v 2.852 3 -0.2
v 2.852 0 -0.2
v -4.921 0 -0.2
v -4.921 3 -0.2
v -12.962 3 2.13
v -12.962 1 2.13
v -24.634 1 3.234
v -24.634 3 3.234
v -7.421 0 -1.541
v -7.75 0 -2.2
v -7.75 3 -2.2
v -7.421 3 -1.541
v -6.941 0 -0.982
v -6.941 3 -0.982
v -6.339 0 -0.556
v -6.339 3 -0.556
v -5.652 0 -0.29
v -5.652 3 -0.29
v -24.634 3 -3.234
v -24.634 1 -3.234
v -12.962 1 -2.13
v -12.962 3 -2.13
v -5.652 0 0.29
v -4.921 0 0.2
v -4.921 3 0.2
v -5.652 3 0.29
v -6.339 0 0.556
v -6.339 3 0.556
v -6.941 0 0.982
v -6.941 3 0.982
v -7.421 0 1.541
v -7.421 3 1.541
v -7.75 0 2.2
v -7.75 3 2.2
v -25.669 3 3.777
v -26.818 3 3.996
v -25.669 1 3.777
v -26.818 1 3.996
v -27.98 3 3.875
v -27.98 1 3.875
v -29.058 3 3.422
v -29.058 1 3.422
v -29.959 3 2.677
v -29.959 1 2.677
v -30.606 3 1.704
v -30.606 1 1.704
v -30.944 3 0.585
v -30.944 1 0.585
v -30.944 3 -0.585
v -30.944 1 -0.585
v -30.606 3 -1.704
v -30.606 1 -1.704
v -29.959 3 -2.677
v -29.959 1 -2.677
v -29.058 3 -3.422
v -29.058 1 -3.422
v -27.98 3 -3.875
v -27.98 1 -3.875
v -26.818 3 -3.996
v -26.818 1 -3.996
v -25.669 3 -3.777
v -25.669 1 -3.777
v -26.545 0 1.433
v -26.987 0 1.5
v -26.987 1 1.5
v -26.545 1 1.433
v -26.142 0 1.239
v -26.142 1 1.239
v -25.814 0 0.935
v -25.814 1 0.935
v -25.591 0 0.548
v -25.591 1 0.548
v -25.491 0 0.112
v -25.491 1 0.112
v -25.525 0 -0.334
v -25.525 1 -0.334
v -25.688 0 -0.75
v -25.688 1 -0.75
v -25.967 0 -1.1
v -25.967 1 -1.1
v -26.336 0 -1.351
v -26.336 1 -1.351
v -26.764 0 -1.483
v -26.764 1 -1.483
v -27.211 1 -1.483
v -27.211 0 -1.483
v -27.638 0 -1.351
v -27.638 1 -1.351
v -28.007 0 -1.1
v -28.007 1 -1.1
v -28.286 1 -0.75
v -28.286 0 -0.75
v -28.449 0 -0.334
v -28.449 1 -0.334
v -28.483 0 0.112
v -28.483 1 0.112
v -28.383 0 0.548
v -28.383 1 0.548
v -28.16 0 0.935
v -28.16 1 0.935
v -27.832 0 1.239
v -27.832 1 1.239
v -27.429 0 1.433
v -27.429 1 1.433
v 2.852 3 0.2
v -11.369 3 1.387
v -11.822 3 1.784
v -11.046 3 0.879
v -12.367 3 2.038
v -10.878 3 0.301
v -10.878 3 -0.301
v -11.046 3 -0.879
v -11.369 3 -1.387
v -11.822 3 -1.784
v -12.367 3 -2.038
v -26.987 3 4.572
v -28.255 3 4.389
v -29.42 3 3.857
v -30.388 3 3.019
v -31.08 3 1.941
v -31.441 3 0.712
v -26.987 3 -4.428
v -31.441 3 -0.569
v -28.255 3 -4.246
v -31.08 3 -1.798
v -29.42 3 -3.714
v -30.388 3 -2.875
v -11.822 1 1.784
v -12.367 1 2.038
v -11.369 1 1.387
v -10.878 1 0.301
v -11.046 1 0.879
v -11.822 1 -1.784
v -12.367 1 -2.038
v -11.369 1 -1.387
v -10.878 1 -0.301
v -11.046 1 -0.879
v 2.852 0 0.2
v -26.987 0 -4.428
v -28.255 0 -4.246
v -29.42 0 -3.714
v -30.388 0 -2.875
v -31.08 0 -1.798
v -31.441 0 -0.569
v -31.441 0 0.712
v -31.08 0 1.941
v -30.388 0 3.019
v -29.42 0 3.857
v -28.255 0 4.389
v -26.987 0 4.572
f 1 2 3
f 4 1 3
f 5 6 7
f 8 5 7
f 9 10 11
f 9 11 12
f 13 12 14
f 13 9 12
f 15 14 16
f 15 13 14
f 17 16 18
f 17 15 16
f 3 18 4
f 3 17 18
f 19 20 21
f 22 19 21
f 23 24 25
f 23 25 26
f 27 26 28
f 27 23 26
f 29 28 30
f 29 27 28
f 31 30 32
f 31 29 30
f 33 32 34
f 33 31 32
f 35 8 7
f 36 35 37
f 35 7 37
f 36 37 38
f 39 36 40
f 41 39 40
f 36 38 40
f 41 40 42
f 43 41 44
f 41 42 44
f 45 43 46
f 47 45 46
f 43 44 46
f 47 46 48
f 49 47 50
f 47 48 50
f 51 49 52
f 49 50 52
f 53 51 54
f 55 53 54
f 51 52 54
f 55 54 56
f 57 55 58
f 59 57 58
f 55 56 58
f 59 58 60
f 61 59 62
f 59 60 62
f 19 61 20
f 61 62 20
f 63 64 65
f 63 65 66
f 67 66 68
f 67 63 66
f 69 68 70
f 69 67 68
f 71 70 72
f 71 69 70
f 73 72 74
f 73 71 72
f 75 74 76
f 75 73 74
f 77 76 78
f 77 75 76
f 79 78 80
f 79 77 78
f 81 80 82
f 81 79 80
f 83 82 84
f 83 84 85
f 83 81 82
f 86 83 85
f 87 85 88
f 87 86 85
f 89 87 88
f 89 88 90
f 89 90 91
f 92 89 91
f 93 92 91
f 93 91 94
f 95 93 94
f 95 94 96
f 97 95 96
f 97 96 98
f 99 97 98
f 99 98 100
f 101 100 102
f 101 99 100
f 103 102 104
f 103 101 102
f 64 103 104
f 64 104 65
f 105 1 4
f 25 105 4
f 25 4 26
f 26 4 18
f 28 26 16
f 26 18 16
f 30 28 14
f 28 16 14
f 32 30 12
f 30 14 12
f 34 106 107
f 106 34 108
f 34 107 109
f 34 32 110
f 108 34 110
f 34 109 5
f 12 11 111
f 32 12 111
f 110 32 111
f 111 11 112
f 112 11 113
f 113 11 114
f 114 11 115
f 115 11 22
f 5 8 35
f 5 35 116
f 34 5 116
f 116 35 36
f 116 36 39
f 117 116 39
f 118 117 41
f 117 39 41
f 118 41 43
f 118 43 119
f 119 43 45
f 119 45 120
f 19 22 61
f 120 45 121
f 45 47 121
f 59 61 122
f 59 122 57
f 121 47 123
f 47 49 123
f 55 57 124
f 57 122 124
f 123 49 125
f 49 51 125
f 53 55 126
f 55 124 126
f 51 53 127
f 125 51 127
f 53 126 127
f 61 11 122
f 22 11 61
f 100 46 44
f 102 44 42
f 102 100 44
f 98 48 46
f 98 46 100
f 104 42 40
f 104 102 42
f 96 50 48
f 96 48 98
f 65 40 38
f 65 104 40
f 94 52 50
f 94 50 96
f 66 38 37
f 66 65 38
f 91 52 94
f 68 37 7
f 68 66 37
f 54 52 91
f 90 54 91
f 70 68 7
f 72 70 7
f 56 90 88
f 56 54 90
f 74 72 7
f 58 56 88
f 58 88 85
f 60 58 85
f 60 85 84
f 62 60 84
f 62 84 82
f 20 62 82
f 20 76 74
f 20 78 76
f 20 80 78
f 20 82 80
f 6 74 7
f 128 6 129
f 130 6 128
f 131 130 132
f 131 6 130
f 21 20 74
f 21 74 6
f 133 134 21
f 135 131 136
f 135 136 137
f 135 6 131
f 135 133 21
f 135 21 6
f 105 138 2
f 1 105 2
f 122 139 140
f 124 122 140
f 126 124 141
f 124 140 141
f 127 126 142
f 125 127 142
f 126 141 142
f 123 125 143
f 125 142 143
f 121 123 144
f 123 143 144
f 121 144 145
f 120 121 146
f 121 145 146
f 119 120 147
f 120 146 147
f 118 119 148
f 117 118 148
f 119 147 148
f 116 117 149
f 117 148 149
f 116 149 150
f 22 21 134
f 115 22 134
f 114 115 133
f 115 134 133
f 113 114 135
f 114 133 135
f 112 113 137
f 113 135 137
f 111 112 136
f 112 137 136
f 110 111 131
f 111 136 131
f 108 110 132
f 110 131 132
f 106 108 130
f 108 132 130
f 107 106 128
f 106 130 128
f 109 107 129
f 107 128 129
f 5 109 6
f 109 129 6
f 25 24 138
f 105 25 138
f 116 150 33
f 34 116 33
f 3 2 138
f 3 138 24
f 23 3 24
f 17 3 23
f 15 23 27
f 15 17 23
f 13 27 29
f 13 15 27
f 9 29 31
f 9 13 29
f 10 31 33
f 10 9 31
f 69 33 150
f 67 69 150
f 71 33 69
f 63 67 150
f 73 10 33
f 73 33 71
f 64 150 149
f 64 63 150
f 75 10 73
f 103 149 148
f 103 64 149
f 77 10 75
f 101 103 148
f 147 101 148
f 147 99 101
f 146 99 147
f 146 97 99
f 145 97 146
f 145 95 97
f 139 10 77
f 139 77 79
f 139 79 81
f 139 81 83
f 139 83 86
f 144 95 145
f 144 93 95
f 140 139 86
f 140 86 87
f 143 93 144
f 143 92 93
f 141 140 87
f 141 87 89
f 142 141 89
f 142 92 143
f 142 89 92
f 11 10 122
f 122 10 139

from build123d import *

# Parameters (mm, degrees)
SKETCH2_R           = 1.5
BOSS_EXTRUDE1_DEPTH = 1
BOSS_EXTRUDE2_DEPTH = 3
FILLET1_R           = 3


with BuildPart() as part:
    # Sketch2 → Boss-Extrude1 (new body)
    with BuildSketch(Plane(origin=(0, 0, 0), x_dir=(1, 0, 0), z_dir=(0, 1, 0))):
        with BuildLine():
            Line((-24.633695323, -3.234416395), (-12.961942578, -2.130426094))
            ThreePointArc((-12.961942578, -2.130426094), (-10.856533145, 0), (-12.961942578, 2.130426094))
            Line((-12.961942578, 2.130426094), (-24.633695323, 3.234416395))
            ThreePointArc((-24.633695323, 3.234416395), (-30.987107864, 0), (-24.633695323, -3.234416395))
        make_face()
        with Locations(Location((-26.987107864, 0, 0), (0, 0, 270))):
            Circle(SKETCH2_R, mode=Mode.SUBTRACT)
    extrude(amount=BOSS_EXTRUDE1_DEPTH)

    # Sketch2<3> → Boss-Extrude2 (add)
    with BuildSketch(Plane(origin=(0, 0, 0), x_dir=(1, 0, 0), z_dir=(0, 1, 0))):
        with BuildLine():
            Line((-7.749705802, -2.2), (-7.749705802, -0.2))
            Line((-7.749705802, -0.2), (2.851546862, -0.2))
            Line((2.851546862, -0.2), (2.851546862, 0.2))
            Line((2.851546862, 0.2), (-7.749705802, 0.2))
            Line((-7.749705802, 0.2), (-7.749705802, 2.2))
            Line((-7.749705802, 2.2), (-26.987107864, 4.428352964))
            ThreePointArc((-26.987107864, 4.428352964), (-31.487107864, -0.071647036), (-26.987107864, -4.571647036))
            Line((-26.987107864, -4.571647036), (-7.749705802, -2.2))
        make_face()
        with BuildLine():
            ThreePointArc((-24.633695323, -3.234416395), (-30.987107864, 0), (-24.633695323, 3.234416395))
            Line((-24.633695323, 3.234416395), (-12.961942578, 2.130426094))
            ThreePointArc((-12.961942578, 2.130426094), (-10.856533145, 0), (-12.961942578, -2.130426094))
            Line((-12.961942578, -2.130426094), (-24.633695323, -3.234416395))
        make_face(mode=Mode.SUBTRACT)
    extrude(amount=BOSS_EXTRUDE2_DEPTH)

    # Fillet1
    # the kernel refuses this fillet: 3 mm, written as the material it adds along each edge
    with BuildSketch(Plane(origin=(-7.749705802, 0, 0.2), x_dir=(0, 0, 1), z_dir=(0, 1, 0))) as fillet1_piece_1:
        with BuildLine():
            CenterArc((3, 2.828427125), FILLET1_R, 180, 70.528779366)
            Line((0, 2.828427125), (-0.06, 2.828427125))
            Line((-0.06, 2.828427125), (-0.06, 0))
            Line((-0.06, 0), (0, -0.06))
            ThreePointArc((0, -0.06), (1, -0.06), (1.98, -0.056568542))
            Line((1.98, -0.056568542), (2, 0))
        make_face()
    extrude(amount=3)
    with BuildSketch(Plane(origin=(-7.749705802, 0, -0.2), x_dir=(1, 0, 0), z_dir=(0, 1, 0))) as fillet1_piece_2:
        with BuildLine():
            CenterArc((2.828427125, 3), FILLET1_R, 199.471220634, 70.528779366)
            Line((0, 2), (-0.056568542, 1.98))
            ThreePointArc((-0.056568542, 1.98), (-0.06, 1), (-0.06, 0))
            Line((-0.06, 0), (0, -0.06))
            Line((0, -0.06), (2.828427125, -0.06))
            Line((2.828427125, -0.06), (2.828427125, 0))
        make_face()
    extrude(amount=3)


solid = part.part
